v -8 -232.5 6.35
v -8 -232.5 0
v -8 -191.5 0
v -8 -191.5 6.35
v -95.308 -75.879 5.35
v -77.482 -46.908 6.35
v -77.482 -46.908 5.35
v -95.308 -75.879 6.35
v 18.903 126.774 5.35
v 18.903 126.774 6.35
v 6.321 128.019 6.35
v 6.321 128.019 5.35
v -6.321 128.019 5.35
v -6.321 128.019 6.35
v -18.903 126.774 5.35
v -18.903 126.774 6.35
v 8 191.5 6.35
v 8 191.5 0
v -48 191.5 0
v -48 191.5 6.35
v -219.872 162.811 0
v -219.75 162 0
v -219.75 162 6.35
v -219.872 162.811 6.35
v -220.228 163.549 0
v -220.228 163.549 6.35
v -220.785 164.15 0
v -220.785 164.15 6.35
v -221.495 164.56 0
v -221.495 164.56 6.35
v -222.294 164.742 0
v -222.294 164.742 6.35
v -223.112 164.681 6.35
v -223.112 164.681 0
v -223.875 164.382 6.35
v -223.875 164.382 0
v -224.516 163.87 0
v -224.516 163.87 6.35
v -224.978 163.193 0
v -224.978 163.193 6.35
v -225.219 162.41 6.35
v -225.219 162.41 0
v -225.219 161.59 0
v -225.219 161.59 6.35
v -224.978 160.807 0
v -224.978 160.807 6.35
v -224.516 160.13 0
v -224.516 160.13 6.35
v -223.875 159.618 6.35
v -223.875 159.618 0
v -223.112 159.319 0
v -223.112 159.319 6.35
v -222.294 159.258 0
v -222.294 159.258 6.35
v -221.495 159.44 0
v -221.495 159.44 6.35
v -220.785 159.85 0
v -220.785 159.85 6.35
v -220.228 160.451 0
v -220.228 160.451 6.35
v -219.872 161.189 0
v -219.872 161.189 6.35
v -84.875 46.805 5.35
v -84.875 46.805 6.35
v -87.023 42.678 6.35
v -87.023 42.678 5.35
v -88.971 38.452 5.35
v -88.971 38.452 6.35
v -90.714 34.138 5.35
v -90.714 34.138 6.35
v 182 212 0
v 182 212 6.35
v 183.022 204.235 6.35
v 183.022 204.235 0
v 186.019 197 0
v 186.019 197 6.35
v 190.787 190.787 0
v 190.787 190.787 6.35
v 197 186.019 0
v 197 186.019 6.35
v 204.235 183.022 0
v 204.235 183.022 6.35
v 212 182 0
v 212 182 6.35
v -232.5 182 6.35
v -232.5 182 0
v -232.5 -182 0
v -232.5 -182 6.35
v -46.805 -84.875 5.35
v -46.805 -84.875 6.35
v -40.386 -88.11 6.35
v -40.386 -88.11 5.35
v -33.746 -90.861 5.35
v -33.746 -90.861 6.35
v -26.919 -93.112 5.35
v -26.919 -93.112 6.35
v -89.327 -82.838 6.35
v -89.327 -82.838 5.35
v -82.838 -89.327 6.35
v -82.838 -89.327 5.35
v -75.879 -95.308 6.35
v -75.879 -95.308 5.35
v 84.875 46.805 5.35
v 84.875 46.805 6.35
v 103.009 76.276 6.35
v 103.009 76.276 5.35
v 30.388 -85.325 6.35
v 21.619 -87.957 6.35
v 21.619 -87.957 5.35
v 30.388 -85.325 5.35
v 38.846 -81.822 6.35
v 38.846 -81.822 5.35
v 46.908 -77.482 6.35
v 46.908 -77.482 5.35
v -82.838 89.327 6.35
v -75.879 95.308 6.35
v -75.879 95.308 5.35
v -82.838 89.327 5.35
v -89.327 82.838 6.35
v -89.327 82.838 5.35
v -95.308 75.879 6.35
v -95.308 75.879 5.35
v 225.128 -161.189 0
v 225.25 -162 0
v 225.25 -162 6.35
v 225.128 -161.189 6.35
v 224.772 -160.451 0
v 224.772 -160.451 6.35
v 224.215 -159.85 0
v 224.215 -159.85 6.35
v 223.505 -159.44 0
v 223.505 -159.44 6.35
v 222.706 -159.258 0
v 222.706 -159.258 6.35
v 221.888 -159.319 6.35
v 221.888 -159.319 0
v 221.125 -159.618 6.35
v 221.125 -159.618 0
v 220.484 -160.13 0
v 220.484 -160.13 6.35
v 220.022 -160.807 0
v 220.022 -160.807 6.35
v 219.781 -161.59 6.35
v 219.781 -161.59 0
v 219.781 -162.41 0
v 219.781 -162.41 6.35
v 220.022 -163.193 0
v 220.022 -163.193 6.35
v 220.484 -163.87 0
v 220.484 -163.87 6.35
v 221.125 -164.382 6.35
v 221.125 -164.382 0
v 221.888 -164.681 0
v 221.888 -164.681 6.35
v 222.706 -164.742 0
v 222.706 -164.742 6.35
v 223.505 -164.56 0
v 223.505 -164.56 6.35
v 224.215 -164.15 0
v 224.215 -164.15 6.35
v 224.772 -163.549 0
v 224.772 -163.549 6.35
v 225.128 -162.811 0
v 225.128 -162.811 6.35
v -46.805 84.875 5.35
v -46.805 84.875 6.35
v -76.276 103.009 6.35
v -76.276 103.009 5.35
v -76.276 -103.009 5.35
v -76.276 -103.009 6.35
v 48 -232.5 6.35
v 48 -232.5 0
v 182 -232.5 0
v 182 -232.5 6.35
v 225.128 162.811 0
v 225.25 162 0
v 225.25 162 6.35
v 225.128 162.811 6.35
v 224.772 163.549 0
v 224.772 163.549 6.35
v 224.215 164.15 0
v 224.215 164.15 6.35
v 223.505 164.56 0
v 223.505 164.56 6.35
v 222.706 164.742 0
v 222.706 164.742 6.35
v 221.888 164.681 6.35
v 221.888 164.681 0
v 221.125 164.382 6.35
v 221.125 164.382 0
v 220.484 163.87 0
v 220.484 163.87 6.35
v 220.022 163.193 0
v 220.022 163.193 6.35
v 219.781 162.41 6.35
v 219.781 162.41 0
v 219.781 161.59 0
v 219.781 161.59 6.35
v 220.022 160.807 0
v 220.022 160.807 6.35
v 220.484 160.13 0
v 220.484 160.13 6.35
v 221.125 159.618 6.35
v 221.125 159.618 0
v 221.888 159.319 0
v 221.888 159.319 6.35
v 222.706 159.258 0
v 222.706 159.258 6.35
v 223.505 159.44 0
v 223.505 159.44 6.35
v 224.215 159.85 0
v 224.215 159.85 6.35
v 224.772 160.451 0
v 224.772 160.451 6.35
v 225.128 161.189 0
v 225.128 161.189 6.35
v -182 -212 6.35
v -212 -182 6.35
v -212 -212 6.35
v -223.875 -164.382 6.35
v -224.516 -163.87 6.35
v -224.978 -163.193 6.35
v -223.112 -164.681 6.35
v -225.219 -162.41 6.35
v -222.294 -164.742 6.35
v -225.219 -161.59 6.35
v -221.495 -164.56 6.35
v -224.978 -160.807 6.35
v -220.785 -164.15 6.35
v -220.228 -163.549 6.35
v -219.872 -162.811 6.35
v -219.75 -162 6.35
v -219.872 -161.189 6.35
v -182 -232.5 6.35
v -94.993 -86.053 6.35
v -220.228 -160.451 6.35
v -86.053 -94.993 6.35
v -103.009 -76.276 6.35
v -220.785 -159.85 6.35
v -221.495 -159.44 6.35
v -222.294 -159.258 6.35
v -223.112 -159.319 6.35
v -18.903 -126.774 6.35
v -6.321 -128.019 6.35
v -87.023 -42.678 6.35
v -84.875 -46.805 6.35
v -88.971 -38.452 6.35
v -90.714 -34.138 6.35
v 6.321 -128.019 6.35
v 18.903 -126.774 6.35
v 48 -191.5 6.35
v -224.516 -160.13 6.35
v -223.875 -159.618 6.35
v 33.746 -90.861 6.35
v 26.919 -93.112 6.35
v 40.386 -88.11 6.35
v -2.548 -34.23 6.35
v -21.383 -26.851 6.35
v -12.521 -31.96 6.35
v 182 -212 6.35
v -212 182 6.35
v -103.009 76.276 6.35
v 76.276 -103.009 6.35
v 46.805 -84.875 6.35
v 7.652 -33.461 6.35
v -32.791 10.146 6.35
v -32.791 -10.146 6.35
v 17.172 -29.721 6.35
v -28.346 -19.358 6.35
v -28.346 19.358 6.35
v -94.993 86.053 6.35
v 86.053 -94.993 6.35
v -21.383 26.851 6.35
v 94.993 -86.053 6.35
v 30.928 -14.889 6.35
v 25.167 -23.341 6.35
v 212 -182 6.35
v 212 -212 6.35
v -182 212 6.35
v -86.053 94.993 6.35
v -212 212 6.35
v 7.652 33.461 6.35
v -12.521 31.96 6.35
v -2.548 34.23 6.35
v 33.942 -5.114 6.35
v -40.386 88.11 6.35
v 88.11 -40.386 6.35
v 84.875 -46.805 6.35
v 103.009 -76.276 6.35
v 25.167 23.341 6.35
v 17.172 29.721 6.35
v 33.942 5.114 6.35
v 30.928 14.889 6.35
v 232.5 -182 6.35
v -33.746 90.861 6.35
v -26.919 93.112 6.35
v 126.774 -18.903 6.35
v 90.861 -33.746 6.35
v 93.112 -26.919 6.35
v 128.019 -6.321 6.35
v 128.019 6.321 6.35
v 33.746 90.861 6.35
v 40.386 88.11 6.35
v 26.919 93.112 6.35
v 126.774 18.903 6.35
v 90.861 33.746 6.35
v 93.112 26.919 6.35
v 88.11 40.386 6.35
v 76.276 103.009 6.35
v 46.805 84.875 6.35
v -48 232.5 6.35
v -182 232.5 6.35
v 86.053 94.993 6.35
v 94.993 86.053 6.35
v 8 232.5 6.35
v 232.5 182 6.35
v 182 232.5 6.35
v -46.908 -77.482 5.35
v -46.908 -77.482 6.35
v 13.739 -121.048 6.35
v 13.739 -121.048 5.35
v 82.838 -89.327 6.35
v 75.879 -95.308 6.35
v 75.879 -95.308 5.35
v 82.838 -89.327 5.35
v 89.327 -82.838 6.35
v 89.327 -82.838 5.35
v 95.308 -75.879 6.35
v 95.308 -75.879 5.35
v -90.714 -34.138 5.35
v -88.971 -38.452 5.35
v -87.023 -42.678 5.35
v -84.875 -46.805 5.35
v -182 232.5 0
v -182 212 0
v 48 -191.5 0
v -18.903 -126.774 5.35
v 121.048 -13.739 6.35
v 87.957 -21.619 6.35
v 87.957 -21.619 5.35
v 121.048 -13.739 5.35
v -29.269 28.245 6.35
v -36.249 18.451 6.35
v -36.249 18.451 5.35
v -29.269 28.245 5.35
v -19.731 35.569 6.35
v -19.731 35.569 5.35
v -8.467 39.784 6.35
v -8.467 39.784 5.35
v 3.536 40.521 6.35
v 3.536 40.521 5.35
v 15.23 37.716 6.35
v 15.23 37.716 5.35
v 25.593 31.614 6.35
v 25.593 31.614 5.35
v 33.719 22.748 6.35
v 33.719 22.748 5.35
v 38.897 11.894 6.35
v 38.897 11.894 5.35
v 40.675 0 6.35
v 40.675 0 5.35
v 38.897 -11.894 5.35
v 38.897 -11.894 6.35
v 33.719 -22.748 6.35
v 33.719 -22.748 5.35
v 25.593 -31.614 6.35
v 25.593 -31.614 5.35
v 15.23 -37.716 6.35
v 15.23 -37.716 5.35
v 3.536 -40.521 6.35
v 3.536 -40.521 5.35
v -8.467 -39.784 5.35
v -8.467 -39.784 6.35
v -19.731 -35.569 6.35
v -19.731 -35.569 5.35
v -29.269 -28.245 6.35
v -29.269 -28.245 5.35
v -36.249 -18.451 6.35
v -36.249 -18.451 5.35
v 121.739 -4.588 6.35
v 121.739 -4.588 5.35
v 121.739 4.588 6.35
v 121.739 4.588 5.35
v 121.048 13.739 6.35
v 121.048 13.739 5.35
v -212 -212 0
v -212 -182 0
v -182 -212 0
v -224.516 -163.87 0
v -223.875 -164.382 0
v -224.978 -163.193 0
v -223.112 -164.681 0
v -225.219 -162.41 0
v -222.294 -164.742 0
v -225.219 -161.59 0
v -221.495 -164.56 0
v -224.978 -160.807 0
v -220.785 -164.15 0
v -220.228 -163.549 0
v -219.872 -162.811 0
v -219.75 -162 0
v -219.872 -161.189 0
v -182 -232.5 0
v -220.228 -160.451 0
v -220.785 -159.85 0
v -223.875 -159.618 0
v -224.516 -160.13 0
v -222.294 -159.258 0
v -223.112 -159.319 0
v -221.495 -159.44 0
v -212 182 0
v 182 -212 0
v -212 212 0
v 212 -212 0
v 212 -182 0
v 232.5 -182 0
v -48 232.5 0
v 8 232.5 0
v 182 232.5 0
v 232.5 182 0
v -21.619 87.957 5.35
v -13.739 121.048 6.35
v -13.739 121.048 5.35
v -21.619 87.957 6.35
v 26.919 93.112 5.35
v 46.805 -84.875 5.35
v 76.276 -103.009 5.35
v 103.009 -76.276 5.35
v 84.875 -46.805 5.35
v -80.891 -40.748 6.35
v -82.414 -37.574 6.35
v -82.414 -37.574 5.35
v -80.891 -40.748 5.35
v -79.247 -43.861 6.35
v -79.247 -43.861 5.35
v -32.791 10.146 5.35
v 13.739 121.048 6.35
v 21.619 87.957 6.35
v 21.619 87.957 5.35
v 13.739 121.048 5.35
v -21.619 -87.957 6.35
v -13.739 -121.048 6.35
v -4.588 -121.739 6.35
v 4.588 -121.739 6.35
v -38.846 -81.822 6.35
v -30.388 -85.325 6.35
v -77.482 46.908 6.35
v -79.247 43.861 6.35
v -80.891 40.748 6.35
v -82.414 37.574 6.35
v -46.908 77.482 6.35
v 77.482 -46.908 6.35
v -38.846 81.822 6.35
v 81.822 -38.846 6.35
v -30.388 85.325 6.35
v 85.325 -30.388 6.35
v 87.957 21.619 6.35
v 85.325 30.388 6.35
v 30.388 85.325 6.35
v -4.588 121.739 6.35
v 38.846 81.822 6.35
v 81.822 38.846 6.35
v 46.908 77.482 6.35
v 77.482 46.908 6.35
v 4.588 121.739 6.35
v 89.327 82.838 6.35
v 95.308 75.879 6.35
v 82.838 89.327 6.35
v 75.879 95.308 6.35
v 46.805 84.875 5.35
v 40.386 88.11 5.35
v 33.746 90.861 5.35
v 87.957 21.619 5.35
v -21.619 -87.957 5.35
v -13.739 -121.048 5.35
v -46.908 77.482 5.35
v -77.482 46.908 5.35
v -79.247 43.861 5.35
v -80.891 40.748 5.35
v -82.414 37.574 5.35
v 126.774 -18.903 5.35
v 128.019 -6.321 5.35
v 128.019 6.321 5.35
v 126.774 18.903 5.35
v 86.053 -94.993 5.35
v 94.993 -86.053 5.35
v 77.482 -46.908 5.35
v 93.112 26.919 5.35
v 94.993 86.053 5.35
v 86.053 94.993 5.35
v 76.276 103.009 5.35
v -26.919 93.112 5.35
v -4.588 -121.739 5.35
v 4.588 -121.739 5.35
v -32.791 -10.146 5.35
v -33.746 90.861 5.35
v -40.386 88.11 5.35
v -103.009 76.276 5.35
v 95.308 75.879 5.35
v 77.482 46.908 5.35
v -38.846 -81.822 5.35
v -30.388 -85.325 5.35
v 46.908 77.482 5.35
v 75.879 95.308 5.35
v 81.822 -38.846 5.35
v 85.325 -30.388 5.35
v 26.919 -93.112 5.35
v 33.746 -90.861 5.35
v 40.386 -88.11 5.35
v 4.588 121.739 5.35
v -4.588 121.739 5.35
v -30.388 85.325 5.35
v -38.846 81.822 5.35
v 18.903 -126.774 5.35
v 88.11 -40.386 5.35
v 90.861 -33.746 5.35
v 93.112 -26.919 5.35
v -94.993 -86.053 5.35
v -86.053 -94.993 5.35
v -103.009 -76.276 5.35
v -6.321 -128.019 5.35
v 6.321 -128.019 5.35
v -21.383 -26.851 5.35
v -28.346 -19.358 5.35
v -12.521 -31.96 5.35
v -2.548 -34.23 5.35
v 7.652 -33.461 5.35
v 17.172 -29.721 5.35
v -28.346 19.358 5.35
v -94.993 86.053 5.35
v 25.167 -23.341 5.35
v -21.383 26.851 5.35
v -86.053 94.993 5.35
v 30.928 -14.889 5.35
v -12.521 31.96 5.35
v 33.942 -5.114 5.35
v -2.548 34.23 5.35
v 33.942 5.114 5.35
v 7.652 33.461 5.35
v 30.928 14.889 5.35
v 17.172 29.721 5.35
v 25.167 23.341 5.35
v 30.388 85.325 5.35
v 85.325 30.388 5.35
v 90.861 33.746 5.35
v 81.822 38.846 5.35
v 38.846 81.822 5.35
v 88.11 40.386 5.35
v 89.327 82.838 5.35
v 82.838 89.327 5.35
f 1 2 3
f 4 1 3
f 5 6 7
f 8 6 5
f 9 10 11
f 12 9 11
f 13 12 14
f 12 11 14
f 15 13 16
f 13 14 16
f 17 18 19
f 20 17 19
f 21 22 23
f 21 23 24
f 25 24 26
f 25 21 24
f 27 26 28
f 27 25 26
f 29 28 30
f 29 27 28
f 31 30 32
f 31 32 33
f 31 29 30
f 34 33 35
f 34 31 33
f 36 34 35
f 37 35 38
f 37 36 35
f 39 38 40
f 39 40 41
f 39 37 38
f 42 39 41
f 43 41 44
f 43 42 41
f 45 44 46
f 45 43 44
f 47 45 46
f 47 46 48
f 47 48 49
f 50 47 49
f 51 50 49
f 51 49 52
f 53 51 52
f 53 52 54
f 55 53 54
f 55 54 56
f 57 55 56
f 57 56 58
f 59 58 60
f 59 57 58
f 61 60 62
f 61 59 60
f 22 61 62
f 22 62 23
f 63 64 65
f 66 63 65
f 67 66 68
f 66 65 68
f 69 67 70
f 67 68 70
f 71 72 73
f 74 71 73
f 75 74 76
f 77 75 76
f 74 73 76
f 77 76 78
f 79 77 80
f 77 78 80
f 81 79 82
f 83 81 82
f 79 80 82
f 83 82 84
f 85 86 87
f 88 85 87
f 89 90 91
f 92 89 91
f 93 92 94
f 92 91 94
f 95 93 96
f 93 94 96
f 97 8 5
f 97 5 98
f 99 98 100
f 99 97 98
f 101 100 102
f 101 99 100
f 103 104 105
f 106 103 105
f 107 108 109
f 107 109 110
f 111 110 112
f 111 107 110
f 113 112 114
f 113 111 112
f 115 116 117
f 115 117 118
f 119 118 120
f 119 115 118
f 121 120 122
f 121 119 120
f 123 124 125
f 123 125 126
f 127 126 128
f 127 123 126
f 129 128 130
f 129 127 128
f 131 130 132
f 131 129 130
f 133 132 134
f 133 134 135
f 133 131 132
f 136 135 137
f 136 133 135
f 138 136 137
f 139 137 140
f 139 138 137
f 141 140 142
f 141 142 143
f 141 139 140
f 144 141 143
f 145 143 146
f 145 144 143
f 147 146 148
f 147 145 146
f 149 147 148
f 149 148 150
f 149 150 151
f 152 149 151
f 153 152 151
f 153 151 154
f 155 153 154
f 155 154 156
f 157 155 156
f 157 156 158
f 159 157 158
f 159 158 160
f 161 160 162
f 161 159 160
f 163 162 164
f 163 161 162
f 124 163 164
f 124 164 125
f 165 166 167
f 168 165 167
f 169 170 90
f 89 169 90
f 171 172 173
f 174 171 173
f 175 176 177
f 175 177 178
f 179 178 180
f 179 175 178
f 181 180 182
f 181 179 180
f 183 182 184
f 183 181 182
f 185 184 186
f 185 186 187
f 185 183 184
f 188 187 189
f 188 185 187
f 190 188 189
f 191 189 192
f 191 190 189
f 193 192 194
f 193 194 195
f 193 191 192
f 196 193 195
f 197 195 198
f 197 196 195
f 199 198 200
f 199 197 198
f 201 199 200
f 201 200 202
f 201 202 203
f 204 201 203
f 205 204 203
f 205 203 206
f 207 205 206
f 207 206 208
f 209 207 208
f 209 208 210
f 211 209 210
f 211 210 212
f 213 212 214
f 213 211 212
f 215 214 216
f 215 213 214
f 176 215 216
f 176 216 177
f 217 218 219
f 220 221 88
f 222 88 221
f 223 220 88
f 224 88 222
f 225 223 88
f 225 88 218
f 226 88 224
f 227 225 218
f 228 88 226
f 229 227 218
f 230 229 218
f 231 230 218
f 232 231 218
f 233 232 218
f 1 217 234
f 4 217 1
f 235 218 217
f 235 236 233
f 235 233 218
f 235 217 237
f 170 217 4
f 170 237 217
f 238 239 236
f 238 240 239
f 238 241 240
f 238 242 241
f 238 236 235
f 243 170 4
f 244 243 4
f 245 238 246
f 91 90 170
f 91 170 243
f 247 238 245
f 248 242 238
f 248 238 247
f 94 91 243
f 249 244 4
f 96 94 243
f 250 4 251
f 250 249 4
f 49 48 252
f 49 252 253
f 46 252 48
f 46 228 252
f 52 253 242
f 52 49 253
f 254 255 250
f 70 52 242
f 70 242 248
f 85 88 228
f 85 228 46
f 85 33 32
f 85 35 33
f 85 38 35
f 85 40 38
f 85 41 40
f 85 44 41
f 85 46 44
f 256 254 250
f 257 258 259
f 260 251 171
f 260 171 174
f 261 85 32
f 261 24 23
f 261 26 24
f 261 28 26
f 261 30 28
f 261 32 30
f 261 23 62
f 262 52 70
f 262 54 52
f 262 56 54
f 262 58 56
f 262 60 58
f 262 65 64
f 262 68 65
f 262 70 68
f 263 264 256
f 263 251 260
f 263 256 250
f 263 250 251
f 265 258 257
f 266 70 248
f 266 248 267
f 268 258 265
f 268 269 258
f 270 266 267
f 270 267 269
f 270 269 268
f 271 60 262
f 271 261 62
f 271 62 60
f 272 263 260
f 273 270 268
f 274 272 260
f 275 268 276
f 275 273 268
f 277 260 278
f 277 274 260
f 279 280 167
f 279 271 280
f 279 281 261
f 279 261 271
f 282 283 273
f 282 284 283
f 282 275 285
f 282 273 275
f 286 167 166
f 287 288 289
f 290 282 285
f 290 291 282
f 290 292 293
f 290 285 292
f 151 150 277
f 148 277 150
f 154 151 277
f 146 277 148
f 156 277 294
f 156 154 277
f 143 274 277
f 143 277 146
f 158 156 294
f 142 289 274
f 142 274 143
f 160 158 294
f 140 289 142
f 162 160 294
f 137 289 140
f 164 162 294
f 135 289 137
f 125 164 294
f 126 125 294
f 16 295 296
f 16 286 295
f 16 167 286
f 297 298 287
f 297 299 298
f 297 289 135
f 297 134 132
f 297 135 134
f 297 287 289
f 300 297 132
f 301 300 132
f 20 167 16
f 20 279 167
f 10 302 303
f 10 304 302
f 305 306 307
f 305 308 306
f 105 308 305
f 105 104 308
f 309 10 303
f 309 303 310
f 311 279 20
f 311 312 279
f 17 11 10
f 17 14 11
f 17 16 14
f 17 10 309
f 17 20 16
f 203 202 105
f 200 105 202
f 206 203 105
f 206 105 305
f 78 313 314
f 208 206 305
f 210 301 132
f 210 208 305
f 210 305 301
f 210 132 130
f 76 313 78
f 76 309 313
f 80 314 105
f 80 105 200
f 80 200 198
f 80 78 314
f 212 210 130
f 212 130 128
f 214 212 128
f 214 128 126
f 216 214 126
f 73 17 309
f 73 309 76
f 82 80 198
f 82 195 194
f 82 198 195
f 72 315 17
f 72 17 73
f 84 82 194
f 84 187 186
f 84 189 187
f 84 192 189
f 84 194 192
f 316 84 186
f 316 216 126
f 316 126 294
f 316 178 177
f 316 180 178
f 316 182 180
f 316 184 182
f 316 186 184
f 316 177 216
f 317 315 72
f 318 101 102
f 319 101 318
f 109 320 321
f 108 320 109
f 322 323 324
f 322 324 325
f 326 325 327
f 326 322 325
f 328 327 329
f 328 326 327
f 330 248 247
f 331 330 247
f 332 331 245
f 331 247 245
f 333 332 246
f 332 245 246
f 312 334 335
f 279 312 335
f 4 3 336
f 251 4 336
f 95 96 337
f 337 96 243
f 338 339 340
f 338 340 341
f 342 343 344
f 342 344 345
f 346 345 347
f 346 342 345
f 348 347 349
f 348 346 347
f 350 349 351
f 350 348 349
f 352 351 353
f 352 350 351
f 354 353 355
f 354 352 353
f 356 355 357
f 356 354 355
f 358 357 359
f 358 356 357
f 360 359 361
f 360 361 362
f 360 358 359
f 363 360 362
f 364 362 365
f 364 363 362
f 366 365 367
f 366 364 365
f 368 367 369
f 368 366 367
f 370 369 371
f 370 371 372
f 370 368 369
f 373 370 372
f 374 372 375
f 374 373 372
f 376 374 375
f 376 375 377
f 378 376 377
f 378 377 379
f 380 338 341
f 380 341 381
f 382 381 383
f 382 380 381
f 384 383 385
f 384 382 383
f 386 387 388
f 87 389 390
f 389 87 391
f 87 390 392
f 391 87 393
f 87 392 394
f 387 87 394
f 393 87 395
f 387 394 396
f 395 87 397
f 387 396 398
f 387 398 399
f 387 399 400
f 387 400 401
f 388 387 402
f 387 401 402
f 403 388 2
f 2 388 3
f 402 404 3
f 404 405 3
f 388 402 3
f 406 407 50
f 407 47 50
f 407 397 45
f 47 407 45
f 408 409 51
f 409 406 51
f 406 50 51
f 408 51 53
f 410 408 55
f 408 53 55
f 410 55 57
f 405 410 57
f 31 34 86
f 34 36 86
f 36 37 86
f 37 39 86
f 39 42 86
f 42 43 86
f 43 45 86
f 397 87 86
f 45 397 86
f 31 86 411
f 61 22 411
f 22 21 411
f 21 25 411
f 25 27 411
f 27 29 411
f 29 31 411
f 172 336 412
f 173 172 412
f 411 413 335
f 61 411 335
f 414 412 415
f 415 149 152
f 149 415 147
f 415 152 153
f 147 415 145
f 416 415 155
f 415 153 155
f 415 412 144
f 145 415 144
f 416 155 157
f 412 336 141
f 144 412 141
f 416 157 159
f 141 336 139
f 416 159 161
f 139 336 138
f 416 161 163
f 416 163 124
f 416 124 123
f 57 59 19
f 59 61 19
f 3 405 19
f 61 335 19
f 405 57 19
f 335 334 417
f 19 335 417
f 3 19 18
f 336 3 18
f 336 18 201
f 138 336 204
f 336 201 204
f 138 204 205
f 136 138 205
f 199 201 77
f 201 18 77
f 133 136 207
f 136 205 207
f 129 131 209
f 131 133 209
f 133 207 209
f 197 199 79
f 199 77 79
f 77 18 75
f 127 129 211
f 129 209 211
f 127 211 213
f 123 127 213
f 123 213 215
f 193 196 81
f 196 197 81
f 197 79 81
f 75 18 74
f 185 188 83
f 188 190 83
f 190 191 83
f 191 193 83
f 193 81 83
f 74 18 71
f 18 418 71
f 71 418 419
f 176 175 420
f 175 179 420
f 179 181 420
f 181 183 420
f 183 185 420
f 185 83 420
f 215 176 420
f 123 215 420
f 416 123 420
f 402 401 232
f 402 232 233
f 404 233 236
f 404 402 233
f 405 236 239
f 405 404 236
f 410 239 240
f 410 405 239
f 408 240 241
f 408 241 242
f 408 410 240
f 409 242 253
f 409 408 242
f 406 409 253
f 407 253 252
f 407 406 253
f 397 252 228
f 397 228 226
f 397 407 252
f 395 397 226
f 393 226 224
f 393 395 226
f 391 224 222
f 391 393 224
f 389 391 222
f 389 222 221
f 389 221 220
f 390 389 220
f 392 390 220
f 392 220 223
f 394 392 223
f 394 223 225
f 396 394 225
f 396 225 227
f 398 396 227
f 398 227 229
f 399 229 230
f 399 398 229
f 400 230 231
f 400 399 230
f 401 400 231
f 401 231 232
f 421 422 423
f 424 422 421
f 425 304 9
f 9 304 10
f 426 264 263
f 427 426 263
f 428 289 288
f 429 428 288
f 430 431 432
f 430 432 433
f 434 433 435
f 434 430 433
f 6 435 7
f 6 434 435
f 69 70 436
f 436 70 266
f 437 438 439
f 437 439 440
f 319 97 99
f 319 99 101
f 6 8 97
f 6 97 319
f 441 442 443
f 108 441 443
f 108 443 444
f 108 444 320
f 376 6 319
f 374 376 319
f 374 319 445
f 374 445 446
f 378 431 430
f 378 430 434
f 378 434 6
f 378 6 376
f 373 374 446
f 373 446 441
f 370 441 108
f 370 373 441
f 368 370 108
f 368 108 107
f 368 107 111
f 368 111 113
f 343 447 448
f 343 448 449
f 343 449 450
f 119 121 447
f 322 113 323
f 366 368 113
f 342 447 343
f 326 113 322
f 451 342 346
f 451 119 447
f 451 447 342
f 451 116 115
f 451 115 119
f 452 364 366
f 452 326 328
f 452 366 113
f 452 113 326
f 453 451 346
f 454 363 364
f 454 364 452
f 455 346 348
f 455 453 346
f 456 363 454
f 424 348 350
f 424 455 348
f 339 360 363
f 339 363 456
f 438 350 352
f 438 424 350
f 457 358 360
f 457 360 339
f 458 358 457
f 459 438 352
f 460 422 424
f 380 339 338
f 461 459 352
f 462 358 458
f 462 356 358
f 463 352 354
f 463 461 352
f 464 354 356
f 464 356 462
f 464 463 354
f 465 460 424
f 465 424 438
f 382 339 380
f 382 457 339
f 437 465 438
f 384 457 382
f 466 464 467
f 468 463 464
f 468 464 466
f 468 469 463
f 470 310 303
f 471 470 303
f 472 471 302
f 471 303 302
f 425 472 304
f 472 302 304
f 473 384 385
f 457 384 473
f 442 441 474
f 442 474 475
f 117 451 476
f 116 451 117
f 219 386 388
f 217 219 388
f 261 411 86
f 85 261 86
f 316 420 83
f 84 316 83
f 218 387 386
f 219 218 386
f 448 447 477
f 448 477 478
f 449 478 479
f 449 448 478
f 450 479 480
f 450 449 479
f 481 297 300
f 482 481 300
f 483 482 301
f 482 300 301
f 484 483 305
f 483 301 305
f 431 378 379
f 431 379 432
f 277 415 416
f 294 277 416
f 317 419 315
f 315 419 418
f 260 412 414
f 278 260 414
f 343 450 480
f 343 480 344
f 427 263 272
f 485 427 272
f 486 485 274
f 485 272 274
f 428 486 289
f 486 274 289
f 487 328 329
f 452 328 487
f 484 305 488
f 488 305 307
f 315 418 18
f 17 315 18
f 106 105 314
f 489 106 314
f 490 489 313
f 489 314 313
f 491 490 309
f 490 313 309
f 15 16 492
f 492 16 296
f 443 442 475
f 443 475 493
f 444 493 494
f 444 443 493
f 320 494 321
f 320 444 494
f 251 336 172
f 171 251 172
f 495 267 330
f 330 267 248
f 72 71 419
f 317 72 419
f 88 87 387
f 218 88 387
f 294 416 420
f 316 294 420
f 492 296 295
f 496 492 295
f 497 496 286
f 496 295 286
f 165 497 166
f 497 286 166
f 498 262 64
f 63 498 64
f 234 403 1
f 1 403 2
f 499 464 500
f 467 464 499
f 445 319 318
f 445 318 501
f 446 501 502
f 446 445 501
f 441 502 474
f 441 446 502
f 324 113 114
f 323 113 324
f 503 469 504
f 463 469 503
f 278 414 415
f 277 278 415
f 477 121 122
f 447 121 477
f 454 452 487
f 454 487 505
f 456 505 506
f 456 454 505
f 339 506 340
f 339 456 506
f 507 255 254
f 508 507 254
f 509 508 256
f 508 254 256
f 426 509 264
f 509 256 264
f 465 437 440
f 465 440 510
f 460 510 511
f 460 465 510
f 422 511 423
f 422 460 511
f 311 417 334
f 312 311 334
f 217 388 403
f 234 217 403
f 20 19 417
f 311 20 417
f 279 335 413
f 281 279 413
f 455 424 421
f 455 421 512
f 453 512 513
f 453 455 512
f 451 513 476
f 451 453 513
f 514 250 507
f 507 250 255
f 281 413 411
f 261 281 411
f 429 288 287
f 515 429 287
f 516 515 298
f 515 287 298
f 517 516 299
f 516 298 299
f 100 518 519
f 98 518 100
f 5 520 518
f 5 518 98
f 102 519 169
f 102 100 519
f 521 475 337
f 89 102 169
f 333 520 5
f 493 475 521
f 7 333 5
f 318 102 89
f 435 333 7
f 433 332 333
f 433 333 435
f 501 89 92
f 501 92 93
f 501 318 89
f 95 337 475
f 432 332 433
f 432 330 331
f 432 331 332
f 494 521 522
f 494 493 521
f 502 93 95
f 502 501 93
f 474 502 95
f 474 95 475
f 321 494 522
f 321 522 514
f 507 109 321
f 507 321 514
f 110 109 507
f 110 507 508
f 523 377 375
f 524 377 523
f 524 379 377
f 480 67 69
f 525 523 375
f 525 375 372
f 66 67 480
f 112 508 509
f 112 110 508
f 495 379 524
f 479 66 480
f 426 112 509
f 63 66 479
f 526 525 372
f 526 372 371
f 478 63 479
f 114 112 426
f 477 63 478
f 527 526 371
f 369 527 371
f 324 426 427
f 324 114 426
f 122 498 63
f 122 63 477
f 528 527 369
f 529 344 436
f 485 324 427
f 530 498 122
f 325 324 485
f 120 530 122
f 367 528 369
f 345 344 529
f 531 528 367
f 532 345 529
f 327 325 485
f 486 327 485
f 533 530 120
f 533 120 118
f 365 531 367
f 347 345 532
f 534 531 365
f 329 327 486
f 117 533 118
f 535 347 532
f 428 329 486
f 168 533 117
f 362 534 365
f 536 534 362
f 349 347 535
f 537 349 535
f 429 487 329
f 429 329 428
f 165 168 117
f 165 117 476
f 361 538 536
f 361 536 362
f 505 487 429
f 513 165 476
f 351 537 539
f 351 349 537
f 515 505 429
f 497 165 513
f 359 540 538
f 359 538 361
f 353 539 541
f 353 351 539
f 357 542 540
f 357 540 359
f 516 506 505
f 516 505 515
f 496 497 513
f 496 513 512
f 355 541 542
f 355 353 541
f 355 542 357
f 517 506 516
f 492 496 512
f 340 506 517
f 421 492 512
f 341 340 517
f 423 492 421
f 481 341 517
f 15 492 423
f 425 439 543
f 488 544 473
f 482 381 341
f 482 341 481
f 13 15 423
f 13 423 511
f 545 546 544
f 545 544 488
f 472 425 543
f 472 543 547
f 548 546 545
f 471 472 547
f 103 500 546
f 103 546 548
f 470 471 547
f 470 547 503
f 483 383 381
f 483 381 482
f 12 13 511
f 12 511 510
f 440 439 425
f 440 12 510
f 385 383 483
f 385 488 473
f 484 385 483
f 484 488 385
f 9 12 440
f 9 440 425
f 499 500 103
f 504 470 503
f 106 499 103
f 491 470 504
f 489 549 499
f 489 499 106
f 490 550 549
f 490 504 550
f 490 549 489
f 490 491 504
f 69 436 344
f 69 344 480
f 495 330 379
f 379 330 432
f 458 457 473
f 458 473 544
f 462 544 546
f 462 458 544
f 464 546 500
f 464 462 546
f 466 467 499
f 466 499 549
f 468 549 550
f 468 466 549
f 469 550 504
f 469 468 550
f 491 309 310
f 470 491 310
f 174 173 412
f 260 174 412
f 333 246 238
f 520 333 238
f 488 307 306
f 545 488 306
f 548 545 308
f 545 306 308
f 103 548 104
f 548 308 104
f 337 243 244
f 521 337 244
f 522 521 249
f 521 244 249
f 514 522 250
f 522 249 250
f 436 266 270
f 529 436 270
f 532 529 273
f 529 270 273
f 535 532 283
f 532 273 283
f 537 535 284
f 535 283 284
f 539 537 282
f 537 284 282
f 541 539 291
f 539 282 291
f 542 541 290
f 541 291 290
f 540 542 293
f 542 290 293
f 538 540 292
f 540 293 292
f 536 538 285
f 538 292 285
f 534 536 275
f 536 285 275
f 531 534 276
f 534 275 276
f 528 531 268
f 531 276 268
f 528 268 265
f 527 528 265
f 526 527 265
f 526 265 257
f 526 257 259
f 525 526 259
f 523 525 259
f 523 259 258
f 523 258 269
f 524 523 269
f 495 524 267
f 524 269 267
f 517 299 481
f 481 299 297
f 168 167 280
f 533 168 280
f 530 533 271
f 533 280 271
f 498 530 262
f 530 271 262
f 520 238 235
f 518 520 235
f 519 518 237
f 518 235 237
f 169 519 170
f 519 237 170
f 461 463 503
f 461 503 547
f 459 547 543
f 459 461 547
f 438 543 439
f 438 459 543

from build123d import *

# Parameters (mm, degrees)
SKETCH1_R           = 2.75
BOSS_EXTRUDE1_DEPTH = 6.35
CUT_EXTRUDE1_DEPTH  = 6.35
CUT_EXTRUDE2_DEPTH  = 1


with BuildPart() as part:
    # Sketch1 → Boss-Extrude1 (new body)
    with BuildSketch(Plane.XY):
        Polygon((182, -212), (212, -212), (212, -182), (232.5, -182), (232.5, 0), (232.5, 182), (212, 182), (212, 212), (182, 212), (182, 232.5), (8, 232.5), (8, 191.5), (-48, 191.5), (-48, 232.5), (-182, 232.5), (-182, 212), (-212, 212), (-212, 182), (-232.5, 182), (-232.5, 0), (-232.5, -182), (-212, -182), (-212, -212), (-182, -212), (-182, -232.5), (-8, -232.5), (-8, -191.5), (48, -191.5), (48, -232.5), (182, -232.5), align=None)
        with Locations((-222.5, -162)):
            Circle(SKETCH1_R, mode=Mode.SUBTRACT)
        with Locations((222.5, -162)):
            Circle(SKETCH1_R, mode=Mode.SUBTRACT)
        with Locations((222.5, 162)):
            Circle(SKETCH1_R, mode=Mode.SUBTRACT)
        with Locations((-222.5, 162)):
            Circle(SKETCH1_R, mode=Mode.SUBTRACT)
    extrude(amount=BOSS_EXTRUDE1_DEPTH)

    # Sketch2 → Cut-Extrude1 (cut)
    with BuildSketch(Plane.XY.offset(6.35)):
        with BuildLine():
            Line((212, 212), (182, 212))
            ThreePointArc((182, 212), (190.786796564, 190.786796564), (212, 182))
            Line((212, 182), (212, 212))
        make_face()
    extrude(amount=-CUT_EXTRUDE1_DEPTH, mode=Mode.SUBTRACT)

    # Sketch3 → Cut-Extrude2 (cut)
    with BuildSketch(Plane.XY.offset(6.35)):
        with BuildLine():
            Line((-90.71398693, 34.138368447), (-32.791230158, 10.145977022))
            ThreePointArc((-32.791230158, 10.145977022), (34.325, 0), (-32.791230158, -10.145977022))
            Line((-32.791230158, -10.145977022), (-90.71398693, -34.138368447))
            ThreePointArc((-90.71398693, -34.138368447), (-88.022539954, -40.576940312), (-84.874800654, -46.805168935))
            Line((-84.874800654, -46.805168935), (-103.008511577, -76.276321146))
            ThreePointArc((-103.008511577, -76.276321146), (-90.633411679, -90.633411679), (-76.276321146, -103.008511577))
            Line((-76.276321146, -103.008511577), (-46.805168935, -84.874800654))
            ThreePointArc((-46.805168935, -84.874800654), (-37.091591682, -89.547023689), (-26.919294746, -93.111799442))
            Line((-26.919294746, -93.111799442), (-18.90251313, -126.773520983))
            ThreePointArc((-18.90251313, -126.773520983), (0, -128.175), (18.90251313, -126.773520983))
            Line((18.90251313, -126.773520983), (26.919294746, -93.111799442))
            ThreePointArc((26.919294746, -93.111799442), (37.091591682, -89.547023689), (46.805168935, -84.874800654))
            Line((46.805168935, -84.874800654), (76.276321146, -103.008511577))
            ThreePointArc((76.276321146, -103.008511577), (90.633411679, -90.633411679), (103.008511577, -76.276321146))
            Line((103.008511577, -76.276321146), (84.874800654, -46.805168935))
            ThreePointArc((84.874800654, -46.805168935), (89.547023689, -37.091591682), (93.111799442, -26.919294746))
            Line((93.111799442, -26.919294746), (126.773520983, -18.90251313))
            ThreePointArc((126.773520983, -18.90251313), (128.175, 0), (126.773520983, 18.90251313))
            Line((126.773520983, 18.90251313), (93.111799442, 26.919294746))
            ThreePointArc((93.111799442, 26.919294746), (89.547023689, 37.091591682), (84.874800654, 46.805168935))
            Line((84.874800654, 46.805168935), (103.008511577, 76.276321146))
            ThreePointArc((103.008511577, 76.276321146), (90.633411679, 90.633411679), (76.276321146, 103.008511577))
            Line((76.276321146, 103.008511577), (46.805168935, 84.874800654))
            ThreePointArc((46.805168935, 84.874800654), (37.091591682, 89.547023689), (26.919294746, 93.111799442))
            Line((26.919294746, 93.111799442), (18.90251313, 126.773520983))
            ThreePointArc((18.90251313, 126.773520983), (0, 128.175), (-18.90251313, 126.773520983))
            Line((-18.90251313, 126.773520983), (-26.919294746, 93.111799442))
            ThreePointArc((-26.919294746, 93.111799442), (-37.091591682, 89.547023689), (-46.805168935, 84.874800654))
            Line((-46.805168935, 84.874800654), (-76.276321146, 103.008511577))
            ThreePointArc((-76.276321146, 103.008511577), (-90.633411679, 90.633411679), (-103.008511577, 76.276321146))
            Line((-103.008511577, 76.276321146), (-84.874800654, 46.805168935))
            ThreePointArc((-84.874800654, 46.805168935), (-88.022539954, 40.576940312), (-90.71398693, 34.138368447))
        make_face()
        with BuildLine():
            Line((-82.41394096, 37.57356731), (-36.249121046, 18.451472797))
            ThreePointArc((-36.249121046, 18.451472797), (40.675, 0), (-36.249121046, -18.451472797))
            Line((-36.249121046, -18.451472797), (-82.41394096, -37.57356731))
            ThreePointArc((-82.41394096, -37.57356731), (-80.084171036, -42.312600659), (-77.482180911, -46.907806027))
            Line((-77.482180911, -46.907806027), (-95.308362806, -75.879157904))
            ThreePointArc((-95.308362806, -75.879157904), (-86.143283618, -86.143283618), (-75.879157904, -95.308362806))
            Line((-75.879157904, -95.308362806), (-46.907806027, -77.482180911))
            ThreePointArc((-46.907806027, -77.482180911), (-34.661551886, -83.680388657), (-21.619347811, -87.957003276))
            Line((-21.619347811, -87.957003276), (-13.73852254, -121.047856749))
            ThreePointArc((-13.73852254, -121.047856749), (0, -121.825), (13.73852254, -121.047856749))
            Line((13.73852254, -121.047856749), (21.619347811, -87.957003276))
            ThreePointArc((21.619347811, -87.957003276), (34.661551886, -83.680388657), (46.907806027, -77.482180911))
            Line((46.907806027, -77.482180911), (75.879157904, -95.308362806))
            ThreePointArc((75.879157904, -95.308362806), (86.143283618, -86.143283618), (95.308362806, -75.879157904))
            Line((95.308362806, -75.879157904), (77.482180911, -46.907806027))
            ThreePointArc((77.482180911, -46.907806027), (83.680388657, -34.661551886), (87.957003276, -21.619347811))
            Line((87.957003276, -21.619347811), (121.047856749, -13.73852254))
            ThreePointArc((121.047856749, -13.73852254), (121.825, 0), (121.047856749, 13.73852254))
            Line((121.047856749, 13.73852254), (87.957003276, 21.619347811))
            ThreePointArc((87.957003276, 21.619347811), (83.680388657, 34.661551886), (77.482180911, 46.907806027))
            Line((77.482180911, 46.907806027), (95.308362806, 75.879157904))
            ThreePointArc((95.308362806, 75.879157904), (86.143283618, 86.143283618), (75.879157904, 95.308362806))
            Line((75.879157904, 95.308362806), (46.907806027, 77.482180911))
            ThreePointArc((46.907806027, 77.482180911), (34.661551886, 83.680388657), (21.619347811, 87.957003276))
            Line((21.619347811, 87.957003276), (13.73852254, 121.047856749))
            ThreePointArc((13.73852254, 121.047856749), (0, 121.825), (-13.73852254, 121.047856749))
            Line((-13.73852254, 121.047856749), (-21.619347811, 87.957003276))
            ThreePointArc((-21.619347811, 87.957003276), (-34.661551886, 83.680388657), (-46.907806027, 77.482180911))
            Line((-46.907806027, 77.482180911), (-75.879157904, 95.308362806))
            ThreePointArc((-75.879157904, 95.308362806), (-86.143283618, 86.143283618), (-95.308362806, 75.879157904))
            Line((-95.308362806, 75.879157904), (-77.482180911, 46.907806027))
            ThreePointArc((-77.482180911, 46.907806027), (-80.084171036, 42.312600659), (-82.41394096, 37.57356731))
        make_face(mode=Mode.SUBTRACT)
    extrude(amount=-CUT_EXTRUDE2_DEPTH, mode=Mode.SUBTRACT)


solid = part.part
